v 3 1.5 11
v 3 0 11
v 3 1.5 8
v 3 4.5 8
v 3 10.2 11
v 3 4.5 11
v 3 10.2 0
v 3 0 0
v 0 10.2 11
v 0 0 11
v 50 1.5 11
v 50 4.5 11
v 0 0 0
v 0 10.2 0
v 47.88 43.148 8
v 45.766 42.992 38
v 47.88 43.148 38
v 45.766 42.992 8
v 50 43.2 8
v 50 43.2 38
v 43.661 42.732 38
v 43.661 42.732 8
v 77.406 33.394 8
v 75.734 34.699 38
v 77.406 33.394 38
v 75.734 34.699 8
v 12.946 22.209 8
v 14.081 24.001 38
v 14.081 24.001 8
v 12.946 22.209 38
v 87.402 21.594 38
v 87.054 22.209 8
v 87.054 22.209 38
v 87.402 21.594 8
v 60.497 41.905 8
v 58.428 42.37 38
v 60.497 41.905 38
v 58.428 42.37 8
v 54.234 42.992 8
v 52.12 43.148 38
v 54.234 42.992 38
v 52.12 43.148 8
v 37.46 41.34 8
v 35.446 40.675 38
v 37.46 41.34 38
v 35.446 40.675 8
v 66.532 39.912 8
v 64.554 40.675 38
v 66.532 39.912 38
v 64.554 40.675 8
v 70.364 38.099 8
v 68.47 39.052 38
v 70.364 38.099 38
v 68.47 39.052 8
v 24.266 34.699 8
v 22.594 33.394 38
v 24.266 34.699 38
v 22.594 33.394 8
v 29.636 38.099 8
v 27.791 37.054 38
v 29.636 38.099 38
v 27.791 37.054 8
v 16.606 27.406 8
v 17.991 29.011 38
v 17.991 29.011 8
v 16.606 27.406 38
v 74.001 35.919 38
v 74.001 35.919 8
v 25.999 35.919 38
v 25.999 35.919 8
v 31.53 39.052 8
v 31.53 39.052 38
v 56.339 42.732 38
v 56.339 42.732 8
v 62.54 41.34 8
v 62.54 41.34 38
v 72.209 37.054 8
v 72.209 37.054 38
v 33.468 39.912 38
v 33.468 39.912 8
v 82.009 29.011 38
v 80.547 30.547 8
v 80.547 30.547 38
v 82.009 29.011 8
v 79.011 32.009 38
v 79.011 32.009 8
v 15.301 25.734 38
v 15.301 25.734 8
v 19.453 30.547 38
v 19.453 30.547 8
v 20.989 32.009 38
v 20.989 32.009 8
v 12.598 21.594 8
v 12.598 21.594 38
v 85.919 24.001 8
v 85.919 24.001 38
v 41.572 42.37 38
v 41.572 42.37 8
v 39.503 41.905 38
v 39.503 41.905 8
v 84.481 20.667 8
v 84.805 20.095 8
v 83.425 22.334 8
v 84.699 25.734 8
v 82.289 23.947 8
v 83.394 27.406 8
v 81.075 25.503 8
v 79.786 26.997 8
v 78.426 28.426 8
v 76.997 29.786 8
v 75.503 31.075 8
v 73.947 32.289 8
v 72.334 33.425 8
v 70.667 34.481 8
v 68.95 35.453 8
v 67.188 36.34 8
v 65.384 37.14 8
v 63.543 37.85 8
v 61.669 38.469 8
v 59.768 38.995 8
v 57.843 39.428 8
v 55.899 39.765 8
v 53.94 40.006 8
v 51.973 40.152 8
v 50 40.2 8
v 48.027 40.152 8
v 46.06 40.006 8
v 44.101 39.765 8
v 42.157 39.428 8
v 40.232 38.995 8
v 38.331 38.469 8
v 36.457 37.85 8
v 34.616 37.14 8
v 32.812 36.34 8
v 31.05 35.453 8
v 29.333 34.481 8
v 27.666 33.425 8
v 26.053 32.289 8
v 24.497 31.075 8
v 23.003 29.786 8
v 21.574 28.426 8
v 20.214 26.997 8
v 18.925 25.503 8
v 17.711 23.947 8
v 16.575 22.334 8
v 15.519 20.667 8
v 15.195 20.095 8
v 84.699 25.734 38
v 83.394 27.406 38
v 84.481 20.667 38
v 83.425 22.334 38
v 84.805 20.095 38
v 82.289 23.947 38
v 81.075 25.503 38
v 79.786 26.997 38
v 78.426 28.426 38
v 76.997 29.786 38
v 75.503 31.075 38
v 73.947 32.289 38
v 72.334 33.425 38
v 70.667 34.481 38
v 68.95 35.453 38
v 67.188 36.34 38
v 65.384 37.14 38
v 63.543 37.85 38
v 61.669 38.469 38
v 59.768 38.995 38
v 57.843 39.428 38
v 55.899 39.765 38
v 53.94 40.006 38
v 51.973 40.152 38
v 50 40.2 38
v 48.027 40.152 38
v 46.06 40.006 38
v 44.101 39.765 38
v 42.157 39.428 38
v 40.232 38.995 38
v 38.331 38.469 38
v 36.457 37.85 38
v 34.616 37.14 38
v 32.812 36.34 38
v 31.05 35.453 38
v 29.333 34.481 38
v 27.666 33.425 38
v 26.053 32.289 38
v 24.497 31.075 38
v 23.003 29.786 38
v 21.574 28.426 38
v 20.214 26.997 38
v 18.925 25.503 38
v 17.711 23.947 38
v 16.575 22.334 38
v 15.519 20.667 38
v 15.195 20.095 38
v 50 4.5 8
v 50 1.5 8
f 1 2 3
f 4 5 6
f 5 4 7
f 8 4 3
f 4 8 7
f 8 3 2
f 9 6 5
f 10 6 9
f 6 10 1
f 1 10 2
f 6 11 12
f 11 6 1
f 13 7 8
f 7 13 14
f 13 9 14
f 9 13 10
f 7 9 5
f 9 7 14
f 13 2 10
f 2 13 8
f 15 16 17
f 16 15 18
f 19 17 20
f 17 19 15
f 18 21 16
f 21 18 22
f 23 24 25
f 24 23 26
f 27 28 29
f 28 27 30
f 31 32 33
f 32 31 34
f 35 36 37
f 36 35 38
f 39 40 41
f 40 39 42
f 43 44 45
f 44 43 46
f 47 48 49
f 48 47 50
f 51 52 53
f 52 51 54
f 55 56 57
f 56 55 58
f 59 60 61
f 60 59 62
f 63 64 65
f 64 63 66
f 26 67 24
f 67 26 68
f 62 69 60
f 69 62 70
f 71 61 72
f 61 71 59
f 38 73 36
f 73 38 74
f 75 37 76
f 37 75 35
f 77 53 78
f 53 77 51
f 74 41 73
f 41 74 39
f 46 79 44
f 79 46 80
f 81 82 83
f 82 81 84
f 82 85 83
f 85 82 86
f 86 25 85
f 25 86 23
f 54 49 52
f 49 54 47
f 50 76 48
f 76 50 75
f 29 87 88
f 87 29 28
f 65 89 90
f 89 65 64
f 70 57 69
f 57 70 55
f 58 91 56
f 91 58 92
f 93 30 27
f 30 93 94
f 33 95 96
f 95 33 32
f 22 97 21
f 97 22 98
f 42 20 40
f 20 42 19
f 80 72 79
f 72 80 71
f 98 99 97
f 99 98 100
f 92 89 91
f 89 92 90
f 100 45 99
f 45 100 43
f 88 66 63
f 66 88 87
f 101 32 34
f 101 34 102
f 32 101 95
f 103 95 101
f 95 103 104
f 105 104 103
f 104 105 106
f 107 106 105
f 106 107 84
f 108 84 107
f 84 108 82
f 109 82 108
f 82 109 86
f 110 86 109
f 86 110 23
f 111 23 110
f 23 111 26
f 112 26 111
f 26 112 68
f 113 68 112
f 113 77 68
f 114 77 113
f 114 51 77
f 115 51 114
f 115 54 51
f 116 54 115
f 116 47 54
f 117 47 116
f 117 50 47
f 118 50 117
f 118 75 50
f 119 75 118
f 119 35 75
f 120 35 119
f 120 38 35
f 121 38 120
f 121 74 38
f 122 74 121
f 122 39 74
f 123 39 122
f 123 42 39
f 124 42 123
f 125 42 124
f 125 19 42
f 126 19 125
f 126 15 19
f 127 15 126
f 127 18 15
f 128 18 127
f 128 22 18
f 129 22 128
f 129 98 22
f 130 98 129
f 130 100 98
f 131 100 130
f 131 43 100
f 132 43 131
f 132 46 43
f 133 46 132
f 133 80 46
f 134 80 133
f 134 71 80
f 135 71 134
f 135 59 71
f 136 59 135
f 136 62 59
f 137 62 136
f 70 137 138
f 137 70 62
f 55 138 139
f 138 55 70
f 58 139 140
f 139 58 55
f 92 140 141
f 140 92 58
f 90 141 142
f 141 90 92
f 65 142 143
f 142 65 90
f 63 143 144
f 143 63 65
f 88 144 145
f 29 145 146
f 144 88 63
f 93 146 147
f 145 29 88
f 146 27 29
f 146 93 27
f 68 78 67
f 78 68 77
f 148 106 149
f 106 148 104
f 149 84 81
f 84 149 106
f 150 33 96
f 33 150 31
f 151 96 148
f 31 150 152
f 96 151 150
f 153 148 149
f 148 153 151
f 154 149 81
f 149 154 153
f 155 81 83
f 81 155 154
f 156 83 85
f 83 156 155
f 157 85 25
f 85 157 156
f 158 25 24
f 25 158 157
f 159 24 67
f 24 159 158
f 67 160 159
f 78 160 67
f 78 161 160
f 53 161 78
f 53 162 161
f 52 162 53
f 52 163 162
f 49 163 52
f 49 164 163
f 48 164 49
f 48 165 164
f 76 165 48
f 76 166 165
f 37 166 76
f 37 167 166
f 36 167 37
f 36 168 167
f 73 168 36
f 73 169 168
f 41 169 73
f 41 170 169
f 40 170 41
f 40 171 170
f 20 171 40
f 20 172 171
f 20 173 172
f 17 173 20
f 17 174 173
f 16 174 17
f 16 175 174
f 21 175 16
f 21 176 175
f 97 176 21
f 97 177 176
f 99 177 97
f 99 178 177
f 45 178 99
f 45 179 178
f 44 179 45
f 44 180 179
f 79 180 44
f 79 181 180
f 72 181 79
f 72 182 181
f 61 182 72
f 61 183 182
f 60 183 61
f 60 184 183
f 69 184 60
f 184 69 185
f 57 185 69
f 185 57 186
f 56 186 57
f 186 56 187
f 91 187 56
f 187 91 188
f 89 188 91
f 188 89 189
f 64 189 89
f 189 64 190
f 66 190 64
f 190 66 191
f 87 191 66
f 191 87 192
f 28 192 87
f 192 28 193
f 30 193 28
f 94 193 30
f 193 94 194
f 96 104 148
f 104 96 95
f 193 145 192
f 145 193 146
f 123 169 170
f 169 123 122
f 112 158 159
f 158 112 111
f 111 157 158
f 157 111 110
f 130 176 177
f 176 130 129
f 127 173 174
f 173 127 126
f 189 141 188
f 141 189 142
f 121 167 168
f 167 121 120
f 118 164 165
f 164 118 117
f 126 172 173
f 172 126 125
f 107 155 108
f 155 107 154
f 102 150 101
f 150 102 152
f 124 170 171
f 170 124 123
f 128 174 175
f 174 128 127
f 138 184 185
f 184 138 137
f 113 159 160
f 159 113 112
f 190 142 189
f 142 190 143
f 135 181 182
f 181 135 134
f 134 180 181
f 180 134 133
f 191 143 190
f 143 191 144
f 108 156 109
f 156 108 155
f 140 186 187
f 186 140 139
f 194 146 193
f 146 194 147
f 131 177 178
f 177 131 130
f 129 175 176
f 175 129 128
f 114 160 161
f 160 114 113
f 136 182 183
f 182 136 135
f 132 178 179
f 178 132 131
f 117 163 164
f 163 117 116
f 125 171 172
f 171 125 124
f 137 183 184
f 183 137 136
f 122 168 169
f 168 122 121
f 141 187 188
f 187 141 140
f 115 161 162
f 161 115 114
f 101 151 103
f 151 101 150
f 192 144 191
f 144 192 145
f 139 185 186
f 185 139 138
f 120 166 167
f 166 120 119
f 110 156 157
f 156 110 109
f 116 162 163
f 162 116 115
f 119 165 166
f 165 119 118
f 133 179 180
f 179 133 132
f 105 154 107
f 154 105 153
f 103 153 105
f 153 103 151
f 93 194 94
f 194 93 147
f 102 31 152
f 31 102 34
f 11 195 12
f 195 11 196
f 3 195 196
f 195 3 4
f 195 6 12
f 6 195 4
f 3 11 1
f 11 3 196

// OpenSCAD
// file: ../../common/utils.scad
// Common utilities and shared variables
// Include this file at the top of your models:
//   include <../../common/utils.scad>

// ── Units ────────────────────────────────────────────────────────────────────
// All dimensions in millimeters

// ── Print tolerances ─────────────────────────────────────────────────────────
// Gap to add when two parts need to fit together (e.g., peg into a hole)
FIT_CLEARANCE = 0.2;  // mm

// Tolerance for press-fit / tight connections
PRESS_FIT = 0.1;  // mm

// ── Quality settings ─────────────────────────────────────────────────────────
// Override per-model if needed
$fn = $preview ? 32 : 128;  // Circle/sphere resolution

// ── Common layer heights ──────────────────────────────────────────────────────
LAYER_HEIGHT      = 0.2;   // standard
FIRST_LAYER       = 0.3;   // slightly thicker first layer
MIN_WALL          = 0.4;   // single extrusion width (0.4 mm nozzle)
// main file
// Cat water bottle hook clip
// Hooks under the bowl rim, upper arm grips the bottle body.
// Squeeze the arms together to release; lift bottle straight up to refill.
//
// Usage: openscad -o 01-hook-clip.stl 01-hook-clip.scad

include <../../common/utils.scad>

// ── Parameters ────────────────────────────────────────────────────────────────
bowl_od          = 160;   // outer diameter of the metal bowl
bowl_rim_h       =   8;   // height of the bowl rim wall
bowl_rim_thick   =   2;   // thickness of the bowl rim wall

bottle_od        =  80;   // outer diameter of bottle at grip point
bottle_grip_h    =  30;   // vertical height the saddle wraps around

wall             =   3;   // printed wall thickness
clip_gap         =   2;   // gap so the hook slides over the rim (adjust to fit)
arm_length       =  50;   // length of arm from bowl hook to bottle saddle

// ── Derived ───────────────────────────────────────────────────────────────────
hook_id  = bowl_rim_thick + clip_gap + FIT_CLEARANCE;
hook_h   = bowl_rim_h * 0.7;   // hook engages lower portion of rim

saddle_r = bottle_od / 2 + FIT_CLEARANCE;

// ── Modules ───────────────────────────────────────────────────────────────────

// Downward hook that catches under the bowl rim
module bowl_hook() {
    // Outer vertical back
    cube([wall, wall + hook_id + wall, bowl_rim_h + wall]);
    // Horizontal inward tooth at bottom
    translate([0, 0, 0])
        cube([wall, wall, bowl_rim_h + wall]);   // back wall (included above)
    // Inward horizontal shelf
    translate([0, wall, 0])
        cube([wall, hook_id, wall]);
}

// Half-saddle that wraps around the bottle
module bottle_saddle_half() {
    wrap_angle = 120;   // degrees of wrap per half
    difference() {
        cylinder(h = bottle_grip_h, r = saddle_r + wall, $fn = $fn);
        // hollow out
        cylinder(h = bottle_grip_h, r = saddle_r, $fn = $fn);
        // cut to half + wrap_angle/2
        rotate([0, 0, wrap_angle / 2])
            translate([-saddle_r * 2, 0, -1])
                cube([saddle_r * 4, saddle_r * 4, bottle_grip_h + 2]);
        // mirror cut
        rotate([0, 0, 180 - wrap_angle / 2])
            translate([-saddle_r * 4, 0, -1])
                cube([saddle_r * 4, saddle_r * 4, bottle_grip_h + 2]);
    }
}

// Arm connecting hook to saddle
module arm() {
    cube([arm_length, wall, wall]);
}

// ── Assembly ──────────────────────────────────────────────────────────────────
// Bowl hook at origin
bowl_hook();

// Arm running outward from hook
translate([0, wall / 2, bowl_rim_h])
    arm();

// Bottle saddle at end of arm, centred on arm width
translate([arm_length, 0, bowl_rim_h])
    rotate([0, 0, 90])
        bottle_saddle_half();
